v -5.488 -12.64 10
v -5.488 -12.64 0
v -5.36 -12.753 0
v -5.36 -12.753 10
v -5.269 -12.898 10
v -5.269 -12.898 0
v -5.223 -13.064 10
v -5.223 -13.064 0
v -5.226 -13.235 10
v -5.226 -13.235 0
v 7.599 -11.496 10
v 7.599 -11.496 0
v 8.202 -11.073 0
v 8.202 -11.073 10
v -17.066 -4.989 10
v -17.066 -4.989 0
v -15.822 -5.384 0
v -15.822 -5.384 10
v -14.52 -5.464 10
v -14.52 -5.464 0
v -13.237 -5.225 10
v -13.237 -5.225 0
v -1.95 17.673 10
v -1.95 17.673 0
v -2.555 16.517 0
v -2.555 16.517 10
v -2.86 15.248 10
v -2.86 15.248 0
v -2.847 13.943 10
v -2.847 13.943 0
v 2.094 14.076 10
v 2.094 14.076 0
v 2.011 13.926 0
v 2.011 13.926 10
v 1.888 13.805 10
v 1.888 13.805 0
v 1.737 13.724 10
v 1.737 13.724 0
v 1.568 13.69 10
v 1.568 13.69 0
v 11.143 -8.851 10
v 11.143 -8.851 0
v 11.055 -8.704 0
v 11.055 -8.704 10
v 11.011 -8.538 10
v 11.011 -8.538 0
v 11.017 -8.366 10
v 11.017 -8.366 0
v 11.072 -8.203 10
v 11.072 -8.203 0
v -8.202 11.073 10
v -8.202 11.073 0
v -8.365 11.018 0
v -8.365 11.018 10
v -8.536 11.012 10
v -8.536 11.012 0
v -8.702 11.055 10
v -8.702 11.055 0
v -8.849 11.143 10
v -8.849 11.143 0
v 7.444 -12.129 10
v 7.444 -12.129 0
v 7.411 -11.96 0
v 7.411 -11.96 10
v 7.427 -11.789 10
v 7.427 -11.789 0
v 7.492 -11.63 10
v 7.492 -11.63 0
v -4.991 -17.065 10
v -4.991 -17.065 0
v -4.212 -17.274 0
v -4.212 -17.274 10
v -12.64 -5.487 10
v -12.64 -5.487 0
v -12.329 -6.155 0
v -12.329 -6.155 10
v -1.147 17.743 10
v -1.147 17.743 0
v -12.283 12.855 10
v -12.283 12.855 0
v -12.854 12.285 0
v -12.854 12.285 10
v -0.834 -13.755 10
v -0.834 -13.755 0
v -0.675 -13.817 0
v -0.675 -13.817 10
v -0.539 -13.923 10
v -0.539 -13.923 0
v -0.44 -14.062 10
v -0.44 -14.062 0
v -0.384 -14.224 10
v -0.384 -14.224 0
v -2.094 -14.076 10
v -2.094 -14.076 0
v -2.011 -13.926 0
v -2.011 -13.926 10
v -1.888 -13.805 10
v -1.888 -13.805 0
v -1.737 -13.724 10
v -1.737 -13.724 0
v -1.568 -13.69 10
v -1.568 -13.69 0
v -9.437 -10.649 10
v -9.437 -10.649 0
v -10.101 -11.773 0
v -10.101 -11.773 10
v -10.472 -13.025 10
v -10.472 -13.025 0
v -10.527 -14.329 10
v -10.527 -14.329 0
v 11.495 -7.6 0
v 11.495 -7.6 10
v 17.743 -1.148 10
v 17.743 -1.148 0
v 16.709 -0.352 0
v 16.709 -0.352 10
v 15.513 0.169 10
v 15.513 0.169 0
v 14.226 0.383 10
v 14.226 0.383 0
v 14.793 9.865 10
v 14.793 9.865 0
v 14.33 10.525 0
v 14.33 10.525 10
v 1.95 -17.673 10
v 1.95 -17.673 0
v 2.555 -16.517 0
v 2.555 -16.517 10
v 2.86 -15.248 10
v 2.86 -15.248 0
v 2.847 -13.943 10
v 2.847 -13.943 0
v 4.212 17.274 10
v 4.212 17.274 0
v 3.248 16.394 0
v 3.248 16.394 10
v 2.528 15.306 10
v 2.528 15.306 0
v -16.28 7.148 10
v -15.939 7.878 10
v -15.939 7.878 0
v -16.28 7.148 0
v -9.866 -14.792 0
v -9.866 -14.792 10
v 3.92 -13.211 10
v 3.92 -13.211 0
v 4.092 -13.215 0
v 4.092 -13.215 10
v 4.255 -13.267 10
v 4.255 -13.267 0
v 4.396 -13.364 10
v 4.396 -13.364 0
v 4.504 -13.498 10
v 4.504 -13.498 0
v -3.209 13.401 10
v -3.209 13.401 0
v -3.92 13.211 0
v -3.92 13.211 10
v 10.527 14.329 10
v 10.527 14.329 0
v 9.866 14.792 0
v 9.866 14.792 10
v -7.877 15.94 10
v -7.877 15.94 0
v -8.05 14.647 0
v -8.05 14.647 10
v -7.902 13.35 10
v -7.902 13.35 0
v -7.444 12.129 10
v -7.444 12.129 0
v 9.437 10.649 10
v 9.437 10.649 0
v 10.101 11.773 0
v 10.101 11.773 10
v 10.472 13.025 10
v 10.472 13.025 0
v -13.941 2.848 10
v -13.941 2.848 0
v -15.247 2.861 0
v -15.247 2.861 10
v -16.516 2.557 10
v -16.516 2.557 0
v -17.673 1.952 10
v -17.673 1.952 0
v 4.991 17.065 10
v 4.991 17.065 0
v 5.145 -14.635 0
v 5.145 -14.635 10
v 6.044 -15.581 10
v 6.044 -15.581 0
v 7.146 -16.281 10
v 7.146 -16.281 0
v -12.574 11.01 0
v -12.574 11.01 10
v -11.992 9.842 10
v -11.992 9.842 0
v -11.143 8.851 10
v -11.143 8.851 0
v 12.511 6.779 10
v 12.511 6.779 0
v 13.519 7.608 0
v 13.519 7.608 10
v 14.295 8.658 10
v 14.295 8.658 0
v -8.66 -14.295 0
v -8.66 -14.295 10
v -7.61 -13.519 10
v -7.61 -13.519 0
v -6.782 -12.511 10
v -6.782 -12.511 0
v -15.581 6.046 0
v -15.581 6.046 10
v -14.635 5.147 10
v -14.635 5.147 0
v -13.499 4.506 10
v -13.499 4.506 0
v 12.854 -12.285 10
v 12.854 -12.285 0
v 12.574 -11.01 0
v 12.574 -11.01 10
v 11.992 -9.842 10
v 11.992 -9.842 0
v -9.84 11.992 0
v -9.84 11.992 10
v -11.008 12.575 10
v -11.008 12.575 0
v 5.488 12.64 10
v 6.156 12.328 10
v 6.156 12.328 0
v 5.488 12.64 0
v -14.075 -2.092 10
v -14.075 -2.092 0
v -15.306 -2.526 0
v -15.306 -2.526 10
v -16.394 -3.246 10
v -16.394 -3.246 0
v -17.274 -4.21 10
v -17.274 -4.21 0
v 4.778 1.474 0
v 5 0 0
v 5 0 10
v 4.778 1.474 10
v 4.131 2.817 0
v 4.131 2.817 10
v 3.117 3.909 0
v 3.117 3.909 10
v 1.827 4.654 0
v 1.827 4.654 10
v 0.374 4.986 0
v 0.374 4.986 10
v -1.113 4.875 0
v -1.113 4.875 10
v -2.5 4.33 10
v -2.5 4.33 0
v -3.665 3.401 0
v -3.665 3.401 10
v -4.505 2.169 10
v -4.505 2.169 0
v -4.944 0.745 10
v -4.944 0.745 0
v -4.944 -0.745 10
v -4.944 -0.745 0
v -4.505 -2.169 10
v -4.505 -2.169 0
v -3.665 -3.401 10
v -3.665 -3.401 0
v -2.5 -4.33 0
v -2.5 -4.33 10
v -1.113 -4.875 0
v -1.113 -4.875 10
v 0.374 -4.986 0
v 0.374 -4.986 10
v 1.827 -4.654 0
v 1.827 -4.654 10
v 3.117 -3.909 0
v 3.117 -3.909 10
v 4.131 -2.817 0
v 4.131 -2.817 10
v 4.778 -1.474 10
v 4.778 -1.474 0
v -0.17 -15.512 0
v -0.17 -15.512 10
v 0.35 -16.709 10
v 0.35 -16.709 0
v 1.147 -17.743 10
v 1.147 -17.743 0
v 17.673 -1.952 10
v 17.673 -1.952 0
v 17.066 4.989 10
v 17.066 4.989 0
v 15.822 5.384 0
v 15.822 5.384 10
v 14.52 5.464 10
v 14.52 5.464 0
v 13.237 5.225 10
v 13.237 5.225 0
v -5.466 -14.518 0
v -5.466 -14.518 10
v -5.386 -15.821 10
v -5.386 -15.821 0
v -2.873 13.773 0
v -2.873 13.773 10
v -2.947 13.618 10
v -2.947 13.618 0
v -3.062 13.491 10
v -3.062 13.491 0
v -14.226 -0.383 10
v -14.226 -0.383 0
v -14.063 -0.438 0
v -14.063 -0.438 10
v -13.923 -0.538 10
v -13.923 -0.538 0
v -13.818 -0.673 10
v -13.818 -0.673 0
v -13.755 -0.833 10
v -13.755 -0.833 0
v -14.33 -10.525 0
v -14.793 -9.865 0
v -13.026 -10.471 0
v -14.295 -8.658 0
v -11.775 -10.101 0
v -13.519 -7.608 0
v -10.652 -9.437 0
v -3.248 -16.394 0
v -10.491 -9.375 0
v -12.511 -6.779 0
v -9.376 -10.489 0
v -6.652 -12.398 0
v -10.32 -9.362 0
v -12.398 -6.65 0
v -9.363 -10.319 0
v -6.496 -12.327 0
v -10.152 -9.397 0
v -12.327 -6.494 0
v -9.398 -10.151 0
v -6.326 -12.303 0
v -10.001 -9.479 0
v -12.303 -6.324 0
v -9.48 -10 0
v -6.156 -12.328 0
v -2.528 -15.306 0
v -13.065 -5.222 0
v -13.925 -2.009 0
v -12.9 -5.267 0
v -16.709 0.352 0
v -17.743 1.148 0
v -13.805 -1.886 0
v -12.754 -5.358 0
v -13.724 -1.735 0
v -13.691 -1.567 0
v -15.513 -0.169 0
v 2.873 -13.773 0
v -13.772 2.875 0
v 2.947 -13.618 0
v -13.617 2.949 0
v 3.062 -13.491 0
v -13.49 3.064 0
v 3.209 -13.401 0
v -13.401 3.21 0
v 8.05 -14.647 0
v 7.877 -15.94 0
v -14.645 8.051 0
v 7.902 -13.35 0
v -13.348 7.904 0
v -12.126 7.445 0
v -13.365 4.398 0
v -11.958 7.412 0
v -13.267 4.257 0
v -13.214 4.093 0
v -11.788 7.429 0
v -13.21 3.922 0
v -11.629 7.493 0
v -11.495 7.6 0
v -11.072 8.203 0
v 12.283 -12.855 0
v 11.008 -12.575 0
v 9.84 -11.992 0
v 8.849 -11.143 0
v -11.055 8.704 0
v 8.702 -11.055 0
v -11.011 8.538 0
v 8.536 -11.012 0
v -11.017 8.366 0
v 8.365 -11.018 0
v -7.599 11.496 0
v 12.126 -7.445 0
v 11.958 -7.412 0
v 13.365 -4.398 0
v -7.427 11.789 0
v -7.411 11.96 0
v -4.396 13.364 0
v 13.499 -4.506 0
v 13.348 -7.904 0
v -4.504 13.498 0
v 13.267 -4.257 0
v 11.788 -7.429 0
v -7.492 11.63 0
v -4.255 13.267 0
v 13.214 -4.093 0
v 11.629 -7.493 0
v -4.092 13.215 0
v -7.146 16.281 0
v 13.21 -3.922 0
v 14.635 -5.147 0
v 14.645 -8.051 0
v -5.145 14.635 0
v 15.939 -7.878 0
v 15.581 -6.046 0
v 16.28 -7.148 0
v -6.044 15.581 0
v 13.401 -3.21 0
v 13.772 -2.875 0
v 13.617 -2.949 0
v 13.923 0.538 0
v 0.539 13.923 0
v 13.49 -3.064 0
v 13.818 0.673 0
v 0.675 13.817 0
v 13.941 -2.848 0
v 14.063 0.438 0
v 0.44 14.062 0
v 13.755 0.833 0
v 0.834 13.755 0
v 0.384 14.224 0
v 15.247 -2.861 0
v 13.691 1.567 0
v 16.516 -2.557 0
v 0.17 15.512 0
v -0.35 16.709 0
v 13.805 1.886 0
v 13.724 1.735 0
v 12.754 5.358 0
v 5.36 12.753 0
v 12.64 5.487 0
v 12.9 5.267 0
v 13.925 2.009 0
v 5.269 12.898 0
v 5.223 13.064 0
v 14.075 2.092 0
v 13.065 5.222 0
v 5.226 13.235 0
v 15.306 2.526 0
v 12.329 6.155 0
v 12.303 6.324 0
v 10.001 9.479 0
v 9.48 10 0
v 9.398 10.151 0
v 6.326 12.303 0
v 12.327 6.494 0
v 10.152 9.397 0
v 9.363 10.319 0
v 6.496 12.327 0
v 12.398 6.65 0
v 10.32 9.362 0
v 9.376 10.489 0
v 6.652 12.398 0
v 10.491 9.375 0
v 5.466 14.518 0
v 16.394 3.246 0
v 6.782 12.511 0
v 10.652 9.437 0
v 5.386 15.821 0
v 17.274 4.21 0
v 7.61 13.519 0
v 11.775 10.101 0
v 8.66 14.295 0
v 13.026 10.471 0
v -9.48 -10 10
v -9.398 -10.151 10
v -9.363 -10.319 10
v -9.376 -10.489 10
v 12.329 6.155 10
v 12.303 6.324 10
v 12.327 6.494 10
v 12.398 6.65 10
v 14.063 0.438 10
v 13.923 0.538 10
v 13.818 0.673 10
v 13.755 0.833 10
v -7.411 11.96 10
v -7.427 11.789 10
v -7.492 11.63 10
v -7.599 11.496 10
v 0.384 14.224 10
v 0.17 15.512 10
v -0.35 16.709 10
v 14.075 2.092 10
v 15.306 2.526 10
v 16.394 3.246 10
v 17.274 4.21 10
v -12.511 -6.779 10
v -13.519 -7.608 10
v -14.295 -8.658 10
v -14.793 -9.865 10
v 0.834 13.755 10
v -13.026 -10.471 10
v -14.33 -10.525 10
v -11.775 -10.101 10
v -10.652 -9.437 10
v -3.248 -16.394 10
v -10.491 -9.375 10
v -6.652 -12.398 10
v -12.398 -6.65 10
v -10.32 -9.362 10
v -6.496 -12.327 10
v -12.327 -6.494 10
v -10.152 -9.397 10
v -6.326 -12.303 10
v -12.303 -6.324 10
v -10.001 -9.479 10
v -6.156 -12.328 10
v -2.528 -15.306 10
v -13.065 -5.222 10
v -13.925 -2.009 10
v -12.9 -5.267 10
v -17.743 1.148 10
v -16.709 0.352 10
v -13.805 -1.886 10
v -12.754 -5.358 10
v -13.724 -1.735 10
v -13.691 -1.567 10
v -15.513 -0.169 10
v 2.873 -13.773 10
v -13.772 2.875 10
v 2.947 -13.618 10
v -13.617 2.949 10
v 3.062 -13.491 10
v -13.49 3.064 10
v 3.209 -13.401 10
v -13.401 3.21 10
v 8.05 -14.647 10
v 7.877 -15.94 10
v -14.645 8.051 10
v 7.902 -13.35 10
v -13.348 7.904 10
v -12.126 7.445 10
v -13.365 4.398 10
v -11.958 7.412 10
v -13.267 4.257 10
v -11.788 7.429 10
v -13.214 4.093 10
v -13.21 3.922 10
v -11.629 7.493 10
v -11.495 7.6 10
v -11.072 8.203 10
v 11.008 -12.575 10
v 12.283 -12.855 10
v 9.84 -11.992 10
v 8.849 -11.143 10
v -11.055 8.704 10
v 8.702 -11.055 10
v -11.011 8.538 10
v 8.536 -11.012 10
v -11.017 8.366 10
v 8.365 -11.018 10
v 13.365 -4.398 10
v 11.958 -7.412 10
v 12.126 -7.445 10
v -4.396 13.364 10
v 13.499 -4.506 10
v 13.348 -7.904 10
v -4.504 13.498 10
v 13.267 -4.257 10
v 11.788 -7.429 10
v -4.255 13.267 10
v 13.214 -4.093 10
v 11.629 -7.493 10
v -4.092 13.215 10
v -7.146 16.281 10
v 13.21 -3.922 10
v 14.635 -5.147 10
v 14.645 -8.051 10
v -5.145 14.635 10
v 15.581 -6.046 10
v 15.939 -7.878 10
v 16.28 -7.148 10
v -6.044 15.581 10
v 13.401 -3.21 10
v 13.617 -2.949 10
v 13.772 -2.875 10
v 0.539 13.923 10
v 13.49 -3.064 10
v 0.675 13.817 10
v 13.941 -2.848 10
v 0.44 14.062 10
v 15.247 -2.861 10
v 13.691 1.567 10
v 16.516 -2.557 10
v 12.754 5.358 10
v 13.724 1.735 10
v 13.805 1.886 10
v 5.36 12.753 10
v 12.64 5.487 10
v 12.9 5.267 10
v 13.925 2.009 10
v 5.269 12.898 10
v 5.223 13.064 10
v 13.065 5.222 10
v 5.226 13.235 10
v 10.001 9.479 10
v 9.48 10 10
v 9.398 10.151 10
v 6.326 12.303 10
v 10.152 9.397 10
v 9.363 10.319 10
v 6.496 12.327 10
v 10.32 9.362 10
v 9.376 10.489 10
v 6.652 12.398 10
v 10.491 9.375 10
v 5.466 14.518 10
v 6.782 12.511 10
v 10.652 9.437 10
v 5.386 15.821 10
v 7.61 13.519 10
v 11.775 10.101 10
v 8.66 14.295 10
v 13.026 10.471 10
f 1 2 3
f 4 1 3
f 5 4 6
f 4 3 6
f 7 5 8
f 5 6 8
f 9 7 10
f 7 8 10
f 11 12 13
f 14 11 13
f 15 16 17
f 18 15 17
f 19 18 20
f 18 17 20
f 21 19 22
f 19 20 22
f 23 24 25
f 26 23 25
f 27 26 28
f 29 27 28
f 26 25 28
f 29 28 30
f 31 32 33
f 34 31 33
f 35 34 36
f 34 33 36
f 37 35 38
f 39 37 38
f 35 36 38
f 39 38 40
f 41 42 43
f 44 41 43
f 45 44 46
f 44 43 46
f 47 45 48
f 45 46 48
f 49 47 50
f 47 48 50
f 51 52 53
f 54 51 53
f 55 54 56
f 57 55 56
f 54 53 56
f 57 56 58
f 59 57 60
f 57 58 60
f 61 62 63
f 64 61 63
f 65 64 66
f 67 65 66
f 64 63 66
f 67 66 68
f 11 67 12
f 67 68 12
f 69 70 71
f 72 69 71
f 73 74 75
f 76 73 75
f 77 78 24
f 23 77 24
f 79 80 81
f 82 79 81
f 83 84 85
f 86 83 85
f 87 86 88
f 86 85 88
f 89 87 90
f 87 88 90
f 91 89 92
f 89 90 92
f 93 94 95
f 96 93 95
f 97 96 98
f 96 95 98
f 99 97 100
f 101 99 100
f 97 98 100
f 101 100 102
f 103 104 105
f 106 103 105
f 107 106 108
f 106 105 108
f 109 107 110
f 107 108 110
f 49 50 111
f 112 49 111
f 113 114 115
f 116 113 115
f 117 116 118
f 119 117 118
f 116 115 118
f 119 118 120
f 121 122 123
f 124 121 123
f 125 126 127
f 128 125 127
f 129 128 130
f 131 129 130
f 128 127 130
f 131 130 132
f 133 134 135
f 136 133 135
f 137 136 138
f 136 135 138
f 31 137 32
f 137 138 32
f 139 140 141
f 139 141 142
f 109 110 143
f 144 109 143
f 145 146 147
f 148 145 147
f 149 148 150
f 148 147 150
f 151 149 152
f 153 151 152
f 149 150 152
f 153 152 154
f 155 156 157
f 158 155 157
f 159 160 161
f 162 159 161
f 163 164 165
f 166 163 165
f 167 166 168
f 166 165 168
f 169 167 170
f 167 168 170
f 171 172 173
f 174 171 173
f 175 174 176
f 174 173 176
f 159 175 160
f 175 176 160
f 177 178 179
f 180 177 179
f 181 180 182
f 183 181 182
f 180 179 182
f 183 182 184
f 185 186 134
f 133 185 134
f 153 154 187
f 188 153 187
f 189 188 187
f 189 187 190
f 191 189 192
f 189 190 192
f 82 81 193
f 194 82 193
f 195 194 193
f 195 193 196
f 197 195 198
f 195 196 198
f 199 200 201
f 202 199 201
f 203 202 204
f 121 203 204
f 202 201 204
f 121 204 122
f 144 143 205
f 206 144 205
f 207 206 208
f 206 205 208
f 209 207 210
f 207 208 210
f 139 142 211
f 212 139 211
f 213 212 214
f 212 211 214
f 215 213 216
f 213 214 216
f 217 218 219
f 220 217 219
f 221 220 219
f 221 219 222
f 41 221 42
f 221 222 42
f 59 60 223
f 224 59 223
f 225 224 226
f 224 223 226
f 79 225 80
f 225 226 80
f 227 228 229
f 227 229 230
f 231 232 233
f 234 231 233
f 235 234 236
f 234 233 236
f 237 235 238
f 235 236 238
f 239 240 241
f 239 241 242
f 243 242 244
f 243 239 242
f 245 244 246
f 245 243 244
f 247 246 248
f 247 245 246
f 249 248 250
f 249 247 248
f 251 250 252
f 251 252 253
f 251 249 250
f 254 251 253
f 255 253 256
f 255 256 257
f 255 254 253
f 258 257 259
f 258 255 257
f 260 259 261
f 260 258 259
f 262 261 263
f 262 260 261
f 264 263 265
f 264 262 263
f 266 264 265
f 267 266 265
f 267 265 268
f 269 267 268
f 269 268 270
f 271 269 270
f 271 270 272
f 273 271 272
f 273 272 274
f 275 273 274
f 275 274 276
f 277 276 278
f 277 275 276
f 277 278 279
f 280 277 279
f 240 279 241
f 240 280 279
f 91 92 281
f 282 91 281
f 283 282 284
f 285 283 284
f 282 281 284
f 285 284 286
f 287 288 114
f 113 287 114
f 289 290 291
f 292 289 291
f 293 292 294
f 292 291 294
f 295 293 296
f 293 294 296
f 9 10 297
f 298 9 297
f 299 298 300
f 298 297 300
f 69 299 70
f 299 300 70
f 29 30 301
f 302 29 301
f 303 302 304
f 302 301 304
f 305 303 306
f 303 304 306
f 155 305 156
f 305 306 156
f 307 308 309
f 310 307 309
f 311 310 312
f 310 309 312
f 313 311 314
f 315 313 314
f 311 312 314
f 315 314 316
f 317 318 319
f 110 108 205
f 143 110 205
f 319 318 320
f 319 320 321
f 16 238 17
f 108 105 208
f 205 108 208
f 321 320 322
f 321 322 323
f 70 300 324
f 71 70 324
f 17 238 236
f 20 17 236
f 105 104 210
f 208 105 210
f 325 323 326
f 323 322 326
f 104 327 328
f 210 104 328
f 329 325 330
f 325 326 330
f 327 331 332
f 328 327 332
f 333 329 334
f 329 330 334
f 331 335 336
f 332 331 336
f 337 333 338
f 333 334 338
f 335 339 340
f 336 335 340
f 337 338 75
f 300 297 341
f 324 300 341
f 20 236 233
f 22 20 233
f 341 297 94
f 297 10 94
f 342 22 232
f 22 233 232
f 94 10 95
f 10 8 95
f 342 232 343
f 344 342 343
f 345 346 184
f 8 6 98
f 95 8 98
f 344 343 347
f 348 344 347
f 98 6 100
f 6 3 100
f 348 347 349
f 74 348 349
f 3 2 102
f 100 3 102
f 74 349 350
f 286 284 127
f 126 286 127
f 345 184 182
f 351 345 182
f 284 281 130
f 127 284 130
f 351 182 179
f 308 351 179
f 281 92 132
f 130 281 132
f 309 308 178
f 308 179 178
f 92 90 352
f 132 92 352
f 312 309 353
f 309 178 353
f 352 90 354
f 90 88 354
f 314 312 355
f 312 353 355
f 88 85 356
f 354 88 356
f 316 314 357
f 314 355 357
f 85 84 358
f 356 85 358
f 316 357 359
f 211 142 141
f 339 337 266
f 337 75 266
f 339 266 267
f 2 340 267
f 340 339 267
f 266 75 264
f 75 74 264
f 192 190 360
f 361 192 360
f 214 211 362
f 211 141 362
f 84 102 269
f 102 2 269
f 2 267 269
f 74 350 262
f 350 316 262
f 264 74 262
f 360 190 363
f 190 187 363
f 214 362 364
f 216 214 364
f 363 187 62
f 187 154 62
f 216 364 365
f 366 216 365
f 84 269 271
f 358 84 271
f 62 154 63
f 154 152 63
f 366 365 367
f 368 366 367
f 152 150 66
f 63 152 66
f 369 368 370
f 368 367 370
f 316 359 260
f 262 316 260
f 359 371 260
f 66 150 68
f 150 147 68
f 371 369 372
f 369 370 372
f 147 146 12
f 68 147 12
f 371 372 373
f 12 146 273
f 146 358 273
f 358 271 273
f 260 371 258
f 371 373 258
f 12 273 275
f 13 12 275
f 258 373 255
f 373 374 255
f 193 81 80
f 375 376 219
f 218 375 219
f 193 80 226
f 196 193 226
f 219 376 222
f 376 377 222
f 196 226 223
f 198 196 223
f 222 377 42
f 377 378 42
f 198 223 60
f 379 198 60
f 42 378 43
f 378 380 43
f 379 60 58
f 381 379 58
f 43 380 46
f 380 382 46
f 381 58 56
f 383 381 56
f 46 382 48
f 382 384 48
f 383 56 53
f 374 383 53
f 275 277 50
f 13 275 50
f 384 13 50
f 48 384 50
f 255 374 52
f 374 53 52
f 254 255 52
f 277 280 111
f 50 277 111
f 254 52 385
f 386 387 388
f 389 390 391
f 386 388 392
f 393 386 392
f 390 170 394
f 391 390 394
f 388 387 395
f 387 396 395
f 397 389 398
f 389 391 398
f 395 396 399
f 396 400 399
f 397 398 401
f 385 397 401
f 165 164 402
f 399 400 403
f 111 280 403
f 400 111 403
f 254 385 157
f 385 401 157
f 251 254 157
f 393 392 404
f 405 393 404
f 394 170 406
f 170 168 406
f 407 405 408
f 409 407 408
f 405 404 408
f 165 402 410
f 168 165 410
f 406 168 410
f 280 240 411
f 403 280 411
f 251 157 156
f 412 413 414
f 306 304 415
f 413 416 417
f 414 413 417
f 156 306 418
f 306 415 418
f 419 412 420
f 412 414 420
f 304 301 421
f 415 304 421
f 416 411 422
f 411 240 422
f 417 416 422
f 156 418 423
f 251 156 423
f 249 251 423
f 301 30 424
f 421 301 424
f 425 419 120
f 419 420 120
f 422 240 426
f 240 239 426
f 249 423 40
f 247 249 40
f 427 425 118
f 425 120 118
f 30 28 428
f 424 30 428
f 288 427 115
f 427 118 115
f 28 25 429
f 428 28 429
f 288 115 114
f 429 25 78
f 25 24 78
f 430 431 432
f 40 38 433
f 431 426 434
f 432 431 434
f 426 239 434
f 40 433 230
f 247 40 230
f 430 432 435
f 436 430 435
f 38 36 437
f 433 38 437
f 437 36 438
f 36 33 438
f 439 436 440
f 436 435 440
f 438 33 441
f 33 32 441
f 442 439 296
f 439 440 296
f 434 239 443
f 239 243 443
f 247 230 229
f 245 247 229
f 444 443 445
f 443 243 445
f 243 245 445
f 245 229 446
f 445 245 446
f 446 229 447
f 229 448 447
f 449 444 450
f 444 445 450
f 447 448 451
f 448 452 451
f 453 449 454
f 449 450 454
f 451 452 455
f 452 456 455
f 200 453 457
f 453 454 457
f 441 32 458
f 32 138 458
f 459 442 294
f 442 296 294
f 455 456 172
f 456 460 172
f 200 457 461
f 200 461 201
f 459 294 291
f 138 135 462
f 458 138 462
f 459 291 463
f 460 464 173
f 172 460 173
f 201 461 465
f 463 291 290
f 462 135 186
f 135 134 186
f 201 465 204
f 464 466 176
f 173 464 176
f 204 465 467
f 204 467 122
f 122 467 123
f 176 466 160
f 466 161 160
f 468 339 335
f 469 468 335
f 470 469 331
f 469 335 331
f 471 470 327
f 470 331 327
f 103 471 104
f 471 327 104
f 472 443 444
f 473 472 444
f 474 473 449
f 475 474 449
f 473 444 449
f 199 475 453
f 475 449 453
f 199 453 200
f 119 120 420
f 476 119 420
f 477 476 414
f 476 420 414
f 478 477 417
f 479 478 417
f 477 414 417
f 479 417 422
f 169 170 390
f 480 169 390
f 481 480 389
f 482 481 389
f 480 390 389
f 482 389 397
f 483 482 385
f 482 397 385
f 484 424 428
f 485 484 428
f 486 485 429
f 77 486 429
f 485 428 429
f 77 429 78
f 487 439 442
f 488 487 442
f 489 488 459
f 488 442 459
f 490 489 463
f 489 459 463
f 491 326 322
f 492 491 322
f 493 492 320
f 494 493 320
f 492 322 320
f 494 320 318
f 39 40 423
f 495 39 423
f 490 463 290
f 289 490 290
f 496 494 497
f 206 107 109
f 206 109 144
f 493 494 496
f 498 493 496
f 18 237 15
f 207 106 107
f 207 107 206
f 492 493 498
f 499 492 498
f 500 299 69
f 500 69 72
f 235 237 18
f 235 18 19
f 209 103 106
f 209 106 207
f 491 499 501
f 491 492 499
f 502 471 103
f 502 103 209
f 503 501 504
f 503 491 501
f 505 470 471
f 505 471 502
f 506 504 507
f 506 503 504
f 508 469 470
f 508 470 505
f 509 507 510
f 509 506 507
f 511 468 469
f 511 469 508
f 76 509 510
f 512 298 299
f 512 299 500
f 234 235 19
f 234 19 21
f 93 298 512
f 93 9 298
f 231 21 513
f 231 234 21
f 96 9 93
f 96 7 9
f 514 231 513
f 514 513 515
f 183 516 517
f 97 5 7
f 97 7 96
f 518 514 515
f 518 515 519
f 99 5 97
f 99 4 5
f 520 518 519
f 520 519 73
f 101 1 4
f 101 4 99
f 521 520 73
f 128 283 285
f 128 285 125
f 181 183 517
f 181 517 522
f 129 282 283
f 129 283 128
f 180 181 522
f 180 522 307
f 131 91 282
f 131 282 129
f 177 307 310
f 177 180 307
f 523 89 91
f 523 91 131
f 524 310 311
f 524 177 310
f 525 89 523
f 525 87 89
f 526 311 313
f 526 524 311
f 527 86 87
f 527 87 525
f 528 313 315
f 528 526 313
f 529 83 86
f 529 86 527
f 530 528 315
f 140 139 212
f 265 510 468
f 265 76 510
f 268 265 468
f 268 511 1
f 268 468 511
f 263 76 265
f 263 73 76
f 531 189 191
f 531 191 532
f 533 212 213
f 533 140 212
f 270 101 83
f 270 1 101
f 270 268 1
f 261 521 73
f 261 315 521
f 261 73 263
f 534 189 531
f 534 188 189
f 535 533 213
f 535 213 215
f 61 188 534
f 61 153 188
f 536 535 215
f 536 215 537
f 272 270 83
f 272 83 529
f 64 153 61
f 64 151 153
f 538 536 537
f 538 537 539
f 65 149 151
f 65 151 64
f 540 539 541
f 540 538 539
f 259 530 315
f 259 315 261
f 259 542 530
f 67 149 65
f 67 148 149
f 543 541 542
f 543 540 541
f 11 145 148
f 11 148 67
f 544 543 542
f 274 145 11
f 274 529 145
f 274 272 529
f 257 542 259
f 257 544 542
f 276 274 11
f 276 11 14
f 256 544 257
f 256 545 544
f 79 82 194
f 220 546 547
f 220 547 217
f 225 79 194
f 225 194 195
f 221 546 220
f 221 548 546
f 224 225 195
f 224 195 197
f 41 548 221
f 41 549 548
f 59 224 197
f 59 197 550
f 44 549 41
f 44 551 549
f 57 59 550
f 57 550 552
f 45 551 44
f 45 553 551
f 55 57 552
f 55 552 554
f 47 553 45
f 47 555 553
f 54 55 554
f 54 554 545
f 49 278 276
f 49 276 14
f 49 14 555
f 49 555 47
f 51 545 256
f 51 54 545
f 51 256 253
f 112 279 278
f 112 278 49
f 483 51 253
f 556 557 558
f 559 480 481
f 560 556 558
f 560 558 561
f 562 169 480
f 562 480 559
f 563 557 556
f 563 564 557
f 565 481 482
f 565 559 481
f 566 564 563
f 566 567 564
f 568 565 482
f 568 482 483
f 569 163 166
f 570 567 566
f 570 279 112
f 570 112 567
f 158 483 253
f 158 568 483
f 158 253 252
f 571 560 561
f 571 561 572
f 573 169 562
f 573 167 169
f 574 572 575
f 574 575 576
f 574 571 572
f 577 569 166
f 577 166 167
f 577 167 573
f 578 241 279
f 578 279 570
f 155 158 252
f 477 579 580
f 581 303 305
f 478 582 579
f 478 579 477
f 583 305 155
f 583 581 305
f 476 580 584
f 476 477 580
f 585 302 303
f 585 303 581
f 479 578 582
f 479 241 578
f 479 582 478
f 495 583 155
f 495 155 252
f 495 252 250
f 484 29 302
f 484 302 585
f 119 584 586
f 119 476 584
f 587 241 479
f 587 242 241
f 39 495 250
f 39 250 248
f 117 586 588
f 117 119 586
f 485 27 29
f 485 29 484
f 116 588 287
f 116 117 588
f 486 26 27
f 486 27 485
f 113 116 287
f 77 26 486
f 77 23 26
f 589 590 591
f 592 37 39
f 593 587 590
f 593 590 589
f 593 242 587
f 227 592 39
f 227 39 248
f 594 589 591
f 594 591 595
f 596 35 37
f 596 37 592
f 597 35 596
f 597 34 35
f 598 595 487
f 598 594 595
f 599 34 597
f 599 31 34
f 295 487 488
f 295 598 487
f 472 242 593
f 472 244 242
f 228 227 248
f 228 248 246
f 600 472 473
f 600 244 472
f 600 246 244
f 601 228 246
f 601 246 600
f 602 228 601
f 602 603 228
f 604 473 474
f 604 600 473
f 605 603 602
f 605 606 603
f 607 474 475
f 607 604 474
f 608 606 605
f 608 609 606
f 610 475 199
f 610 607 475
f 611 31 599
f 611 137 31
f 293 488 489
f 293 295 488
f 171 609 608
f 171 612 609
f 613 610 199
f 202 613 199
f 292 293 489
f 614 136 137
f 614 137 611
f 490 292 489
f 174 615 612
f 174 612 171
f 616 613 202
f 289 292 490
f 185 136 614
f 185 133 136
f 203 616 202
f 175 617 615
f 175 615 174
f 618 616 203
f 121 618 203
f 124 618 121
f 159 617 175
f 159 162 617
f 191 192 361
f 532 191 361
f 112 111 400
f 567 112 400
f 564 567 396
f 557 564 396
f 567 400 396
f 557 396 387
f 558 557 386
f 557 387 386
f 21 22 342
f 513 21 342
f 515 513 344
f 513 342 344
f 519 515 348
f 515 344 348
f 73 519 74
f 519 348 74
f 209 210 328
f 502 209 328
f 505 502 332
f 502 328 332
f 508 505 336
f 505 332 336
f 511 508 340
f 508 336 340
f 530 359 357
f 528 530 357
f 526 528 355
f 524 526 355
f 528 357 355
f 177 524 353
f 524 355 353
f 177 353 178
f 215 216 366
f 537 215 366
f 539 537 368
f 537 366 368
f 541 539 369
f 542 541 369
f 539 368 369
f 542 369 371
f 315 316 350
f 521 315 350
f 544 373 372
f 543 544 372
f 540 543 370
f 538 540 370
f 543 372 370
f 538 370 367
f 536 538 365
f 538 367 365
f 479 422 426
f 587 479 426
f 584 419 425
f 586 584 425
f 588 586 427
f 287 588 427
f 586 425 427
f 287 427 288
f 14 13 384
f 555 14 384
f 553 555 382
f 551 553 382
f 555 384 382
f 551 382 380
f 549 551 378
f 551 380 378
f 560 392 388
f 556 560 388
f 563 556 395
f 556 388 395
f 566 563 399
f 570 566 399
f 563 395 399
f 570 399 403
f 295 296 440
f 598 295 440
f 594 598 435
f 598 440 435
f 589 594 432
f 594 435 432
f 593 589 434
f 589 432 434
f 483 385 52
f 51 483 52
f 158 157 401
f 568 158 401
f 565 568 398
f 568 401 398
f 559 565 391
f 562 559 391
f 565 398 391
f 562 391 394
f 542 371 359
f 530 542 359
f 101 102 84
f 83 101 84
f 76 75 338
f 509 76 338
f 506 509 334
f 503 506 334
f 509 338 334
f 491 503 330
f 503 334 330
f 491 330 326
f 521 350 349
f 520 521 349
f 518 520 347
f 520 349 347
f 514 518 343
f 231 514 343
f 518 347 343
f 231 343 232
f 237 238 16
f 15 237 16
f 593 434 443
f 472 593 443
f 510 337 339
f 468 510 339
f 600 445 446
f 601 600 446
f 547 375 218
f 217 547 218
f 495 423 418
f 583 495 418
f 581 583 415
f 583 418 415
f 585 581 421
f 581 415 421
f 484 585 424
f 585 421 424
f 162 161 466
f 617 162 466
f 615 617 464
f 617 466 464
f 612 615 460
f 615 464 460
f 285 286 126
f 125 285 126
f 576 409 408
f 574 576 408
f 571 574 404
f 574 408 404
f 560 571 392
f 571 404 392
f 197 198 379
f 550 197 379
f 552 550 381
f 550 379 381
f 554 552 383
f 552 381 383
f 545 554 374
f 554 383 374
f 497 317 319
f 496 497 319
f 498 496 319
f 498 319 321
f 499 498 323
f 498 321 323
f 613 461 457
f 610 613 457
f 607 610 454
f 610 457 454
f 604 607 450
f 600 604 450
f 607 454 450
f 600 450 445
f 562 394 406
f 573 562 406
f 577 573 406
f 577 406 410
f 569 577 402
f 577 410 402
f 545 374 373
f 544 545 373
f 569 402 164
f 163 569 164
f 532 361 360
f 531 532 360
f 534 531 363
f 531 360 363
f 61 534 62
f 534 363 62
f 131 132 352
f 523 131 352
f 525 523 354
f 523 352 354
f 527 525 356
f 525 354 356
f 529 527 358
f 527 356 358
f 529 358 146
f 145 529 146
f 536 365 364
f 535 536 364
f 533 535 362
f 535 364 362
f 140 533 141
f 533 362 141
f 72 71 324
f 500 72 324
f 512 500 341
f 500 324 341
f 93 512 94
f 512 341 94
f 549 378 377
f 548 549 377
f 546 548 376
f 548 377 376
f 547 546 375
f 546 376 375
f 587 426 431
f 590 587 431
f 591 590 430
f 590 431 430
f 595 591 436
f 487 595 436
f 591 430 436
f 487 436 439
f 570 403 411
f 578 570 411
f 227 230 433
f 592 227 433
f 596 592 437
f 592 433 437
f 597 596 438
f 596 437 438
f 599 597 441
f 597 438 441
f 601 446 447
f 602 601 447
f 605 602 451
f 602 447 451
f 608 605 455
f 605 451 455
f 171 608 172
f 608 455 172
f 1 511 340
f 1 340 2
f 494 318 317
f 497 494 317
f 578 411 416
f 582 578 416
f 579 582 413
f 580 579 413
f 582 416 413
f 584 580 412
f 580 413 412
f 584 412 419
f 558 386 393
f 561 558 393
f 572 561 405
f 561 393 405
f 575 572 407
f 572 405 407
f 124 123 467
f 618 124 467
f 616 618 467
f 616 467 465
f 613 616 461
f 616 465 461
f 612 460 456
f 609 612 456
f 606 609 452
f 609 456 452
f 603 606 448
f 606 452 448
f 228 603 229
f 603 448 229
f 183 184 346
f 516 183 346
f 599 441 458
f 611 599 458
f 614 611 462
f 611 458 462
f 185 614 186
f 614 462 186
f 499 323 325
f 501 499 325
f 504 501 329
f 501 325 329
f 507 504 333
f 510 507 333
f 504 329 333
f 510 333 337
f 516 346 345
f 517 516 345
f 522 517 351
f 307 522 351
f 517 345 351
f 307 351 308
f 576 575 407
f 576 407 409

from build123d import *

# Parameters (mm, degrees)
F0_R     = 5
F1_DEPTH = 10


with BuildPart() as f1:
    # F0 (on Top) → F1 (new body)
    with BuildSketch(Plane.XY):
        with BuildLine():
            ThreePointArc((0.834247, 13.754724), (0.539473, 13.922611), (0.384061, 14.224148))
            ThreePointArc((0.384061, 14.224148), (-0.053041, 16.126356), (-1.146638, 17.742988))
            Line((-1.146638, 17.742988), (-1.950006, 17.672744))
            ThreePointArc((-1.950006, 17.672744), (-2.74627, 15.891587), (-2.846993, 13.943148))
            ThreePointArc((-2.846993, 13.943148), (-2.94723, 13.618388), (-3.20868, 13.401223))
            Line((-3.20868, 13.401223), (-3.920457, 13.210542))
            ThreePointArc((-3.920457, 13.210542), (-4.254874, 13.267486), (-4.504046, 13.497684))
            ThreePointArc((-4.504046, 13.497684), (-5.565381, 15.135677), (-7.145946, 16.280782))
            Line((-7.145946, 16.280782), (-7.876841, 15.940006))
            ThreePointArc((-7.876841, 15.940006), (-8.015892, 13.993927), (-7.444136, 12.128545))
            ThreePointArc((-7.444136, 12.128545), (-7.427254, 11.789086), (-7.598661, 11.495597))
            Line((-7.598661, 11.495597), (-8.202296, 11.072974))
            ThreePointArc((-8.202296, 11.072974), (-8.536021, 11.012106), (-8.848898, 11.1432))
            ThreePointArc((-8.848898, 11.1432), (-10.406453, 12.319412), (-12.283348, 12.854873))
            Line((-12.283348, 12.854873), (-12.853612, 12.284668))
            ThreePointArc((-12.853612, 12.284668), (-12.31868, 10.408393), (-11.143406, 8.85106))
            ThreePointArc((-11.143406, 8.85106), (-11.01144, 8.537847), (-11.072132, 8.203432))
            Line((-11.072132, 8.203432), (-11.494817, 7.599841))
            ThreePointArc((-11.494817, 7.599841), (-11.787598, 7.428503), (-12.126443, 7.444681))
            ThreePointArc((-12.126443, 7.444681), (-13.992354, 8.017243), (-15.939197, 7.878477))
            Line((-15.939197, 7.878477), (-16.280048, 7.147617))
            ThreePointArc((-16.280048, 7.147617), (-15.135653, 5.567454), (-13.498617, 4.506006))
            ThreePointArc((-13.498617, 4.506006), (-13.267485, 4.256818), (-13.21014, 3.921813))
            Line((-13.21014, 3.921813), (-13.400893, 3.210056))
            ThreePointArc((-13.400893, 3.210056), (-13.617417, 2.948914), (-13.94136, 2.848224))
            ThreePointArc((-13.94136, 2.848224), (-15.890571, 2.748077), (-17.672544, 1.95182))
            Line((-17.672544, 1.95182), (-17.74287, 1.148459))
            ThreePointArc((-17.74287, 1.148459), (-16.127043, 0.054997), (-14.225696, -0.382538))
            ThreePointArc((-14.225696, -0.382538), (-13.923275, -0.537647), (-13.75481, -0.832836))
            Line((-13.75481, -0.832836), (-13.690624, -1.566909))
            ThreePointArc((-13.690624, -1.566909), (-13.804774, -1.886358), (-14.074743, -2.091771))
            ThreePointArc((-14.074743, -2.091771), (-15.87215, -2.852547), (-17.274321, -4.210255))
            Line((-17.274321, -4.210255), (-17.06564, -4.989221))
            ThreePointArc((-17.06564, -4.989221), (-15.173273, -5.464093), (-13.236946, -5.224943))
            ThreePointArc((-13.236946, -5.224943), (-12.899713, -5.267264), (-12.640446, -5.487031))
            Line((-12.640446, -5.487031), (-12.329064, -6.154883))
            ThreePointArc((-12.329064, -6.154883), (-12.327072, -6.494108), (-12.510505, -6.779467))
            ThreePointArc((-12.510505, -6.779467), (-13.939314, -8.109113), (-14.79256, -9.864511))
            Line((-14.79256, -9.864511), (-14.330042, -10.525127))
            ThreePointArc((-14.330042, -10.525127), (-12.389383, -10.324133), (-10.651624, -9.437142))
            ThreePointArc((-10.651624, -9.437142), (-10.320255, -9.36157), (-10.001459, -9.47941))
            Line((-10.001459, -9.47941), (-9.480437, -10.000486))
            ThreePointArc((-9.480437, -10.000486), (-9.362542, -10.318572), (-9.437314, -10.64946))
            ThreePointArc((-9.437314, -10.64946), (-10.32519, -12.387599), (-10.526598, -14.328962))
            Line((-10.526598, -14.328962), (-9.86603, -14.791547))
            ThreePointArc((-9.86603, -14.791547), (-8.11115, -13.93893), (-6.78156, -12.511083))
            ThreePointArc((-6.78156, -12.511083), (-6.496022, -12.326734), (-6.156148, -12.328432))
            Line((-6.156148, -12.328432), (-5.488329, -12.639883))
            ThreePointArc((-5.488329, -12.639883), (-5.268753, -12.898464), (-5.225845, -13.234971))
            ThreePointArc((-5.225845, -13.234971), (-5.465697, -15.171959), (-4.990972, -17.065128))
            Line((-4.990972, -17.065128), (-4.212028, -17.273888))
            ThreePointArc((-4.212028, -17.273888), (-2.854593, -15.872486), (-2.093539, -14.076003))
            ThreePointArc((-2.093539, -14.076003), (-1.888272, -13.805111), (-1.568315, -13.690463))
            Line((-1.568315, -13.690463), (-0.834247, -13.754724))
            ThreePointArc((-0.834247, -13.754724), (-0.539473, -13.922611), (-0.384061, -14.224148))
            ThreePointArc((-0.384061, -14.224148), (0.053041, -16.126356), (1.146638, -17.742988))
            Line((1.146638, -17.742988), (1.950006, -17.672744))
            ThreePointArc((1.950006, -17.672744), (2.74627, -15.891587), (2.846993, -13.943148))
            ThreePointArc((2.846993, -13.943148), (2.94723, -13.618388), (3.20868, -13.401223))
            Line((3.20868, -13.401223), (3.920457, -13.210542))
            ThreePointArc((3.920457, -13.210542), (4.254874, -13.267486), (4.504046, -13.497684))
            ThreePointArc((4.504046, -13.497684), (5.565381, -15.135677), (7.145946, -16.280782))
            Line((7.145946, -16.280782), (7.876841, -15.940006))
            ThreePointArc((7.876841, -15.940006), (8.015892, -13.993927), (7.444136, -12.128545))
            ThreePointArc((7.444136, -12.128545), (7.427254, -11.789086), (7.598661, -11.495597))
            Line((7.598661, -11.495597), (8.202296, -11.072974))
            ThreePointArc((8.202296, -11.072974), (8.536021, -11.012106), (8.848898, -11.1432))
            ThreePointArc((8.848898, -11.1432), (10.406453, -12.319412), (12.283348, -12.854873))
            Line((12.283348, -12.854873), (12.853612, -12.284668))
            ThreePointArc((12.853612, -12.284668), (12.31868, -10.408393), (11.143406, -8.85106))
            ThreePointArc((11.143406, -8.85106), (11.01144, -8.537847), (11.072132, -8.203432))
            Line((11.072132, -8.203432), (11.494817, -7.599841))
            ThreePointArc((11.494817, -7.599841), (11.787598, -7.428503), (12.126443, -7.444681))
            ThreePointArc((12.126443, -7.444681), (13.992354, -8.017243), (15.939197, -7.878477))
            Line((15.939197, -7.878477), (16.280048, -7.147617))
            ThreePointArc((16.280048, -7.147617), (15.135653, -5.567454), (13.498617, -4.506006))
            ThreePointArc((13.498617, -4.506006), (13.267485, -4.256818), (13.21014, -3.921813))
            Line((13.21014, -3.921813), (13.400893, -3.210056))
            ThreePointArc((13.400893, -3.210056), (13.617417, -2.948914), (13.94136, -2.848224))
            ThreePointArc((13.94136, -2.848224), (15.890571, -2.748077), (17.672544, -1.95182))
            Line((17.672544, -1.95182), (17.74287, -1.148459))
            ThreePointArc((17.74287, -1.148459), (16.127043, -0.054997), (14.225696, 0.382538))
            ThreePointArc((14.225696, 0.382538), (13.923275, 0.537647), (13.75481, 0.832836))
            Line((13.75481, 0.832836), (13.690624, 1.566909))
            ThreePointArc((13.690624, 1.566909), (13.804774, 1.886358), (14.074743, 2.091771))
            ThreePointArc((14.074743, 2.091771), (15.87215, 2.852547), (17.274321, 4.210255))
            Line((17.274321, 4.210255), (17.06564, 4.989221))
            ThreePointArc((17.06564, 4.989221), (15.173273, 5.464093), (13.236946, 5.224943))
            ThreePointArc((13.236946, 5.224943), (12.899713, 5.267264), (12.640446, 5.487031))
            Line((12.640446, 5.487031), (12.329064, 6.154883))
            ThreePointArc((12.329064, 6.154883), (12.327072, 6.494108), (12.510505, 6.779467))
            ThreePointArc((12.510505, 6.779467), (13.939314, 8.109113), (14.79256, 9.864511))
            Line((14.79256, 9.864511), (14.330042, 10.525127))
            ThreePointArc((14.330042, 10.525127), (12.389383, 10.324133), (10.651624, 9.437142))
            ThreePointArc((10.651624, 9.437142), (10.320255, 9.36157), (10.001459, 9.47941))
            Line((10.001459, 9.47941), (9.480437, 10.000486))
            ThreePointArc((9.480437, 10.000486), (9.362542, 10.318572), (9.437314, 10.64946))
            ThreePointArc((9.437314, 10.64946), (10.32519, 12.387599), (10.526598, 14.328962))
            Line((10.526598, 14.328962), (9.86603, 14.791547))
            ThreePointArc((9.86603, 14.791547), (8.11115, 13.93893), (6.78156, 12.511083))
            ThreePointArc((6.78156, 12.511083), (6.496022, 12.326734), (6.156148, 12.328432))
            Line((6.156148, 12.328432), (5.488329, 12.639883))
            ThreePointArc((5.488329, 12.639883), (5.268753, 12.898464), (5.225845, 13.234971))
            ThreePointArc((5.225845, 13.234971), (5.465697, 15.171959), (4.990972, 17.065128))
            Line((4.990972, 17.065128), (4.212028, 17.273888))
            ThreePointArc((4.212028, 17.273888), (2.854593, 15.872486), (2.093539, 14.076003))
            ThreePointArc((2.093539, 14.076003), (1.888272, 13.805111), (1.568315, 13.690463))
            Line((1.568315, 13.690463), (0.834247, 13.754724))
        make_face()
        Circle(F0_R, mode=Mode.SUBTRACT)
    extrude(amount=F1_DEPTH)


solid = f1.part
